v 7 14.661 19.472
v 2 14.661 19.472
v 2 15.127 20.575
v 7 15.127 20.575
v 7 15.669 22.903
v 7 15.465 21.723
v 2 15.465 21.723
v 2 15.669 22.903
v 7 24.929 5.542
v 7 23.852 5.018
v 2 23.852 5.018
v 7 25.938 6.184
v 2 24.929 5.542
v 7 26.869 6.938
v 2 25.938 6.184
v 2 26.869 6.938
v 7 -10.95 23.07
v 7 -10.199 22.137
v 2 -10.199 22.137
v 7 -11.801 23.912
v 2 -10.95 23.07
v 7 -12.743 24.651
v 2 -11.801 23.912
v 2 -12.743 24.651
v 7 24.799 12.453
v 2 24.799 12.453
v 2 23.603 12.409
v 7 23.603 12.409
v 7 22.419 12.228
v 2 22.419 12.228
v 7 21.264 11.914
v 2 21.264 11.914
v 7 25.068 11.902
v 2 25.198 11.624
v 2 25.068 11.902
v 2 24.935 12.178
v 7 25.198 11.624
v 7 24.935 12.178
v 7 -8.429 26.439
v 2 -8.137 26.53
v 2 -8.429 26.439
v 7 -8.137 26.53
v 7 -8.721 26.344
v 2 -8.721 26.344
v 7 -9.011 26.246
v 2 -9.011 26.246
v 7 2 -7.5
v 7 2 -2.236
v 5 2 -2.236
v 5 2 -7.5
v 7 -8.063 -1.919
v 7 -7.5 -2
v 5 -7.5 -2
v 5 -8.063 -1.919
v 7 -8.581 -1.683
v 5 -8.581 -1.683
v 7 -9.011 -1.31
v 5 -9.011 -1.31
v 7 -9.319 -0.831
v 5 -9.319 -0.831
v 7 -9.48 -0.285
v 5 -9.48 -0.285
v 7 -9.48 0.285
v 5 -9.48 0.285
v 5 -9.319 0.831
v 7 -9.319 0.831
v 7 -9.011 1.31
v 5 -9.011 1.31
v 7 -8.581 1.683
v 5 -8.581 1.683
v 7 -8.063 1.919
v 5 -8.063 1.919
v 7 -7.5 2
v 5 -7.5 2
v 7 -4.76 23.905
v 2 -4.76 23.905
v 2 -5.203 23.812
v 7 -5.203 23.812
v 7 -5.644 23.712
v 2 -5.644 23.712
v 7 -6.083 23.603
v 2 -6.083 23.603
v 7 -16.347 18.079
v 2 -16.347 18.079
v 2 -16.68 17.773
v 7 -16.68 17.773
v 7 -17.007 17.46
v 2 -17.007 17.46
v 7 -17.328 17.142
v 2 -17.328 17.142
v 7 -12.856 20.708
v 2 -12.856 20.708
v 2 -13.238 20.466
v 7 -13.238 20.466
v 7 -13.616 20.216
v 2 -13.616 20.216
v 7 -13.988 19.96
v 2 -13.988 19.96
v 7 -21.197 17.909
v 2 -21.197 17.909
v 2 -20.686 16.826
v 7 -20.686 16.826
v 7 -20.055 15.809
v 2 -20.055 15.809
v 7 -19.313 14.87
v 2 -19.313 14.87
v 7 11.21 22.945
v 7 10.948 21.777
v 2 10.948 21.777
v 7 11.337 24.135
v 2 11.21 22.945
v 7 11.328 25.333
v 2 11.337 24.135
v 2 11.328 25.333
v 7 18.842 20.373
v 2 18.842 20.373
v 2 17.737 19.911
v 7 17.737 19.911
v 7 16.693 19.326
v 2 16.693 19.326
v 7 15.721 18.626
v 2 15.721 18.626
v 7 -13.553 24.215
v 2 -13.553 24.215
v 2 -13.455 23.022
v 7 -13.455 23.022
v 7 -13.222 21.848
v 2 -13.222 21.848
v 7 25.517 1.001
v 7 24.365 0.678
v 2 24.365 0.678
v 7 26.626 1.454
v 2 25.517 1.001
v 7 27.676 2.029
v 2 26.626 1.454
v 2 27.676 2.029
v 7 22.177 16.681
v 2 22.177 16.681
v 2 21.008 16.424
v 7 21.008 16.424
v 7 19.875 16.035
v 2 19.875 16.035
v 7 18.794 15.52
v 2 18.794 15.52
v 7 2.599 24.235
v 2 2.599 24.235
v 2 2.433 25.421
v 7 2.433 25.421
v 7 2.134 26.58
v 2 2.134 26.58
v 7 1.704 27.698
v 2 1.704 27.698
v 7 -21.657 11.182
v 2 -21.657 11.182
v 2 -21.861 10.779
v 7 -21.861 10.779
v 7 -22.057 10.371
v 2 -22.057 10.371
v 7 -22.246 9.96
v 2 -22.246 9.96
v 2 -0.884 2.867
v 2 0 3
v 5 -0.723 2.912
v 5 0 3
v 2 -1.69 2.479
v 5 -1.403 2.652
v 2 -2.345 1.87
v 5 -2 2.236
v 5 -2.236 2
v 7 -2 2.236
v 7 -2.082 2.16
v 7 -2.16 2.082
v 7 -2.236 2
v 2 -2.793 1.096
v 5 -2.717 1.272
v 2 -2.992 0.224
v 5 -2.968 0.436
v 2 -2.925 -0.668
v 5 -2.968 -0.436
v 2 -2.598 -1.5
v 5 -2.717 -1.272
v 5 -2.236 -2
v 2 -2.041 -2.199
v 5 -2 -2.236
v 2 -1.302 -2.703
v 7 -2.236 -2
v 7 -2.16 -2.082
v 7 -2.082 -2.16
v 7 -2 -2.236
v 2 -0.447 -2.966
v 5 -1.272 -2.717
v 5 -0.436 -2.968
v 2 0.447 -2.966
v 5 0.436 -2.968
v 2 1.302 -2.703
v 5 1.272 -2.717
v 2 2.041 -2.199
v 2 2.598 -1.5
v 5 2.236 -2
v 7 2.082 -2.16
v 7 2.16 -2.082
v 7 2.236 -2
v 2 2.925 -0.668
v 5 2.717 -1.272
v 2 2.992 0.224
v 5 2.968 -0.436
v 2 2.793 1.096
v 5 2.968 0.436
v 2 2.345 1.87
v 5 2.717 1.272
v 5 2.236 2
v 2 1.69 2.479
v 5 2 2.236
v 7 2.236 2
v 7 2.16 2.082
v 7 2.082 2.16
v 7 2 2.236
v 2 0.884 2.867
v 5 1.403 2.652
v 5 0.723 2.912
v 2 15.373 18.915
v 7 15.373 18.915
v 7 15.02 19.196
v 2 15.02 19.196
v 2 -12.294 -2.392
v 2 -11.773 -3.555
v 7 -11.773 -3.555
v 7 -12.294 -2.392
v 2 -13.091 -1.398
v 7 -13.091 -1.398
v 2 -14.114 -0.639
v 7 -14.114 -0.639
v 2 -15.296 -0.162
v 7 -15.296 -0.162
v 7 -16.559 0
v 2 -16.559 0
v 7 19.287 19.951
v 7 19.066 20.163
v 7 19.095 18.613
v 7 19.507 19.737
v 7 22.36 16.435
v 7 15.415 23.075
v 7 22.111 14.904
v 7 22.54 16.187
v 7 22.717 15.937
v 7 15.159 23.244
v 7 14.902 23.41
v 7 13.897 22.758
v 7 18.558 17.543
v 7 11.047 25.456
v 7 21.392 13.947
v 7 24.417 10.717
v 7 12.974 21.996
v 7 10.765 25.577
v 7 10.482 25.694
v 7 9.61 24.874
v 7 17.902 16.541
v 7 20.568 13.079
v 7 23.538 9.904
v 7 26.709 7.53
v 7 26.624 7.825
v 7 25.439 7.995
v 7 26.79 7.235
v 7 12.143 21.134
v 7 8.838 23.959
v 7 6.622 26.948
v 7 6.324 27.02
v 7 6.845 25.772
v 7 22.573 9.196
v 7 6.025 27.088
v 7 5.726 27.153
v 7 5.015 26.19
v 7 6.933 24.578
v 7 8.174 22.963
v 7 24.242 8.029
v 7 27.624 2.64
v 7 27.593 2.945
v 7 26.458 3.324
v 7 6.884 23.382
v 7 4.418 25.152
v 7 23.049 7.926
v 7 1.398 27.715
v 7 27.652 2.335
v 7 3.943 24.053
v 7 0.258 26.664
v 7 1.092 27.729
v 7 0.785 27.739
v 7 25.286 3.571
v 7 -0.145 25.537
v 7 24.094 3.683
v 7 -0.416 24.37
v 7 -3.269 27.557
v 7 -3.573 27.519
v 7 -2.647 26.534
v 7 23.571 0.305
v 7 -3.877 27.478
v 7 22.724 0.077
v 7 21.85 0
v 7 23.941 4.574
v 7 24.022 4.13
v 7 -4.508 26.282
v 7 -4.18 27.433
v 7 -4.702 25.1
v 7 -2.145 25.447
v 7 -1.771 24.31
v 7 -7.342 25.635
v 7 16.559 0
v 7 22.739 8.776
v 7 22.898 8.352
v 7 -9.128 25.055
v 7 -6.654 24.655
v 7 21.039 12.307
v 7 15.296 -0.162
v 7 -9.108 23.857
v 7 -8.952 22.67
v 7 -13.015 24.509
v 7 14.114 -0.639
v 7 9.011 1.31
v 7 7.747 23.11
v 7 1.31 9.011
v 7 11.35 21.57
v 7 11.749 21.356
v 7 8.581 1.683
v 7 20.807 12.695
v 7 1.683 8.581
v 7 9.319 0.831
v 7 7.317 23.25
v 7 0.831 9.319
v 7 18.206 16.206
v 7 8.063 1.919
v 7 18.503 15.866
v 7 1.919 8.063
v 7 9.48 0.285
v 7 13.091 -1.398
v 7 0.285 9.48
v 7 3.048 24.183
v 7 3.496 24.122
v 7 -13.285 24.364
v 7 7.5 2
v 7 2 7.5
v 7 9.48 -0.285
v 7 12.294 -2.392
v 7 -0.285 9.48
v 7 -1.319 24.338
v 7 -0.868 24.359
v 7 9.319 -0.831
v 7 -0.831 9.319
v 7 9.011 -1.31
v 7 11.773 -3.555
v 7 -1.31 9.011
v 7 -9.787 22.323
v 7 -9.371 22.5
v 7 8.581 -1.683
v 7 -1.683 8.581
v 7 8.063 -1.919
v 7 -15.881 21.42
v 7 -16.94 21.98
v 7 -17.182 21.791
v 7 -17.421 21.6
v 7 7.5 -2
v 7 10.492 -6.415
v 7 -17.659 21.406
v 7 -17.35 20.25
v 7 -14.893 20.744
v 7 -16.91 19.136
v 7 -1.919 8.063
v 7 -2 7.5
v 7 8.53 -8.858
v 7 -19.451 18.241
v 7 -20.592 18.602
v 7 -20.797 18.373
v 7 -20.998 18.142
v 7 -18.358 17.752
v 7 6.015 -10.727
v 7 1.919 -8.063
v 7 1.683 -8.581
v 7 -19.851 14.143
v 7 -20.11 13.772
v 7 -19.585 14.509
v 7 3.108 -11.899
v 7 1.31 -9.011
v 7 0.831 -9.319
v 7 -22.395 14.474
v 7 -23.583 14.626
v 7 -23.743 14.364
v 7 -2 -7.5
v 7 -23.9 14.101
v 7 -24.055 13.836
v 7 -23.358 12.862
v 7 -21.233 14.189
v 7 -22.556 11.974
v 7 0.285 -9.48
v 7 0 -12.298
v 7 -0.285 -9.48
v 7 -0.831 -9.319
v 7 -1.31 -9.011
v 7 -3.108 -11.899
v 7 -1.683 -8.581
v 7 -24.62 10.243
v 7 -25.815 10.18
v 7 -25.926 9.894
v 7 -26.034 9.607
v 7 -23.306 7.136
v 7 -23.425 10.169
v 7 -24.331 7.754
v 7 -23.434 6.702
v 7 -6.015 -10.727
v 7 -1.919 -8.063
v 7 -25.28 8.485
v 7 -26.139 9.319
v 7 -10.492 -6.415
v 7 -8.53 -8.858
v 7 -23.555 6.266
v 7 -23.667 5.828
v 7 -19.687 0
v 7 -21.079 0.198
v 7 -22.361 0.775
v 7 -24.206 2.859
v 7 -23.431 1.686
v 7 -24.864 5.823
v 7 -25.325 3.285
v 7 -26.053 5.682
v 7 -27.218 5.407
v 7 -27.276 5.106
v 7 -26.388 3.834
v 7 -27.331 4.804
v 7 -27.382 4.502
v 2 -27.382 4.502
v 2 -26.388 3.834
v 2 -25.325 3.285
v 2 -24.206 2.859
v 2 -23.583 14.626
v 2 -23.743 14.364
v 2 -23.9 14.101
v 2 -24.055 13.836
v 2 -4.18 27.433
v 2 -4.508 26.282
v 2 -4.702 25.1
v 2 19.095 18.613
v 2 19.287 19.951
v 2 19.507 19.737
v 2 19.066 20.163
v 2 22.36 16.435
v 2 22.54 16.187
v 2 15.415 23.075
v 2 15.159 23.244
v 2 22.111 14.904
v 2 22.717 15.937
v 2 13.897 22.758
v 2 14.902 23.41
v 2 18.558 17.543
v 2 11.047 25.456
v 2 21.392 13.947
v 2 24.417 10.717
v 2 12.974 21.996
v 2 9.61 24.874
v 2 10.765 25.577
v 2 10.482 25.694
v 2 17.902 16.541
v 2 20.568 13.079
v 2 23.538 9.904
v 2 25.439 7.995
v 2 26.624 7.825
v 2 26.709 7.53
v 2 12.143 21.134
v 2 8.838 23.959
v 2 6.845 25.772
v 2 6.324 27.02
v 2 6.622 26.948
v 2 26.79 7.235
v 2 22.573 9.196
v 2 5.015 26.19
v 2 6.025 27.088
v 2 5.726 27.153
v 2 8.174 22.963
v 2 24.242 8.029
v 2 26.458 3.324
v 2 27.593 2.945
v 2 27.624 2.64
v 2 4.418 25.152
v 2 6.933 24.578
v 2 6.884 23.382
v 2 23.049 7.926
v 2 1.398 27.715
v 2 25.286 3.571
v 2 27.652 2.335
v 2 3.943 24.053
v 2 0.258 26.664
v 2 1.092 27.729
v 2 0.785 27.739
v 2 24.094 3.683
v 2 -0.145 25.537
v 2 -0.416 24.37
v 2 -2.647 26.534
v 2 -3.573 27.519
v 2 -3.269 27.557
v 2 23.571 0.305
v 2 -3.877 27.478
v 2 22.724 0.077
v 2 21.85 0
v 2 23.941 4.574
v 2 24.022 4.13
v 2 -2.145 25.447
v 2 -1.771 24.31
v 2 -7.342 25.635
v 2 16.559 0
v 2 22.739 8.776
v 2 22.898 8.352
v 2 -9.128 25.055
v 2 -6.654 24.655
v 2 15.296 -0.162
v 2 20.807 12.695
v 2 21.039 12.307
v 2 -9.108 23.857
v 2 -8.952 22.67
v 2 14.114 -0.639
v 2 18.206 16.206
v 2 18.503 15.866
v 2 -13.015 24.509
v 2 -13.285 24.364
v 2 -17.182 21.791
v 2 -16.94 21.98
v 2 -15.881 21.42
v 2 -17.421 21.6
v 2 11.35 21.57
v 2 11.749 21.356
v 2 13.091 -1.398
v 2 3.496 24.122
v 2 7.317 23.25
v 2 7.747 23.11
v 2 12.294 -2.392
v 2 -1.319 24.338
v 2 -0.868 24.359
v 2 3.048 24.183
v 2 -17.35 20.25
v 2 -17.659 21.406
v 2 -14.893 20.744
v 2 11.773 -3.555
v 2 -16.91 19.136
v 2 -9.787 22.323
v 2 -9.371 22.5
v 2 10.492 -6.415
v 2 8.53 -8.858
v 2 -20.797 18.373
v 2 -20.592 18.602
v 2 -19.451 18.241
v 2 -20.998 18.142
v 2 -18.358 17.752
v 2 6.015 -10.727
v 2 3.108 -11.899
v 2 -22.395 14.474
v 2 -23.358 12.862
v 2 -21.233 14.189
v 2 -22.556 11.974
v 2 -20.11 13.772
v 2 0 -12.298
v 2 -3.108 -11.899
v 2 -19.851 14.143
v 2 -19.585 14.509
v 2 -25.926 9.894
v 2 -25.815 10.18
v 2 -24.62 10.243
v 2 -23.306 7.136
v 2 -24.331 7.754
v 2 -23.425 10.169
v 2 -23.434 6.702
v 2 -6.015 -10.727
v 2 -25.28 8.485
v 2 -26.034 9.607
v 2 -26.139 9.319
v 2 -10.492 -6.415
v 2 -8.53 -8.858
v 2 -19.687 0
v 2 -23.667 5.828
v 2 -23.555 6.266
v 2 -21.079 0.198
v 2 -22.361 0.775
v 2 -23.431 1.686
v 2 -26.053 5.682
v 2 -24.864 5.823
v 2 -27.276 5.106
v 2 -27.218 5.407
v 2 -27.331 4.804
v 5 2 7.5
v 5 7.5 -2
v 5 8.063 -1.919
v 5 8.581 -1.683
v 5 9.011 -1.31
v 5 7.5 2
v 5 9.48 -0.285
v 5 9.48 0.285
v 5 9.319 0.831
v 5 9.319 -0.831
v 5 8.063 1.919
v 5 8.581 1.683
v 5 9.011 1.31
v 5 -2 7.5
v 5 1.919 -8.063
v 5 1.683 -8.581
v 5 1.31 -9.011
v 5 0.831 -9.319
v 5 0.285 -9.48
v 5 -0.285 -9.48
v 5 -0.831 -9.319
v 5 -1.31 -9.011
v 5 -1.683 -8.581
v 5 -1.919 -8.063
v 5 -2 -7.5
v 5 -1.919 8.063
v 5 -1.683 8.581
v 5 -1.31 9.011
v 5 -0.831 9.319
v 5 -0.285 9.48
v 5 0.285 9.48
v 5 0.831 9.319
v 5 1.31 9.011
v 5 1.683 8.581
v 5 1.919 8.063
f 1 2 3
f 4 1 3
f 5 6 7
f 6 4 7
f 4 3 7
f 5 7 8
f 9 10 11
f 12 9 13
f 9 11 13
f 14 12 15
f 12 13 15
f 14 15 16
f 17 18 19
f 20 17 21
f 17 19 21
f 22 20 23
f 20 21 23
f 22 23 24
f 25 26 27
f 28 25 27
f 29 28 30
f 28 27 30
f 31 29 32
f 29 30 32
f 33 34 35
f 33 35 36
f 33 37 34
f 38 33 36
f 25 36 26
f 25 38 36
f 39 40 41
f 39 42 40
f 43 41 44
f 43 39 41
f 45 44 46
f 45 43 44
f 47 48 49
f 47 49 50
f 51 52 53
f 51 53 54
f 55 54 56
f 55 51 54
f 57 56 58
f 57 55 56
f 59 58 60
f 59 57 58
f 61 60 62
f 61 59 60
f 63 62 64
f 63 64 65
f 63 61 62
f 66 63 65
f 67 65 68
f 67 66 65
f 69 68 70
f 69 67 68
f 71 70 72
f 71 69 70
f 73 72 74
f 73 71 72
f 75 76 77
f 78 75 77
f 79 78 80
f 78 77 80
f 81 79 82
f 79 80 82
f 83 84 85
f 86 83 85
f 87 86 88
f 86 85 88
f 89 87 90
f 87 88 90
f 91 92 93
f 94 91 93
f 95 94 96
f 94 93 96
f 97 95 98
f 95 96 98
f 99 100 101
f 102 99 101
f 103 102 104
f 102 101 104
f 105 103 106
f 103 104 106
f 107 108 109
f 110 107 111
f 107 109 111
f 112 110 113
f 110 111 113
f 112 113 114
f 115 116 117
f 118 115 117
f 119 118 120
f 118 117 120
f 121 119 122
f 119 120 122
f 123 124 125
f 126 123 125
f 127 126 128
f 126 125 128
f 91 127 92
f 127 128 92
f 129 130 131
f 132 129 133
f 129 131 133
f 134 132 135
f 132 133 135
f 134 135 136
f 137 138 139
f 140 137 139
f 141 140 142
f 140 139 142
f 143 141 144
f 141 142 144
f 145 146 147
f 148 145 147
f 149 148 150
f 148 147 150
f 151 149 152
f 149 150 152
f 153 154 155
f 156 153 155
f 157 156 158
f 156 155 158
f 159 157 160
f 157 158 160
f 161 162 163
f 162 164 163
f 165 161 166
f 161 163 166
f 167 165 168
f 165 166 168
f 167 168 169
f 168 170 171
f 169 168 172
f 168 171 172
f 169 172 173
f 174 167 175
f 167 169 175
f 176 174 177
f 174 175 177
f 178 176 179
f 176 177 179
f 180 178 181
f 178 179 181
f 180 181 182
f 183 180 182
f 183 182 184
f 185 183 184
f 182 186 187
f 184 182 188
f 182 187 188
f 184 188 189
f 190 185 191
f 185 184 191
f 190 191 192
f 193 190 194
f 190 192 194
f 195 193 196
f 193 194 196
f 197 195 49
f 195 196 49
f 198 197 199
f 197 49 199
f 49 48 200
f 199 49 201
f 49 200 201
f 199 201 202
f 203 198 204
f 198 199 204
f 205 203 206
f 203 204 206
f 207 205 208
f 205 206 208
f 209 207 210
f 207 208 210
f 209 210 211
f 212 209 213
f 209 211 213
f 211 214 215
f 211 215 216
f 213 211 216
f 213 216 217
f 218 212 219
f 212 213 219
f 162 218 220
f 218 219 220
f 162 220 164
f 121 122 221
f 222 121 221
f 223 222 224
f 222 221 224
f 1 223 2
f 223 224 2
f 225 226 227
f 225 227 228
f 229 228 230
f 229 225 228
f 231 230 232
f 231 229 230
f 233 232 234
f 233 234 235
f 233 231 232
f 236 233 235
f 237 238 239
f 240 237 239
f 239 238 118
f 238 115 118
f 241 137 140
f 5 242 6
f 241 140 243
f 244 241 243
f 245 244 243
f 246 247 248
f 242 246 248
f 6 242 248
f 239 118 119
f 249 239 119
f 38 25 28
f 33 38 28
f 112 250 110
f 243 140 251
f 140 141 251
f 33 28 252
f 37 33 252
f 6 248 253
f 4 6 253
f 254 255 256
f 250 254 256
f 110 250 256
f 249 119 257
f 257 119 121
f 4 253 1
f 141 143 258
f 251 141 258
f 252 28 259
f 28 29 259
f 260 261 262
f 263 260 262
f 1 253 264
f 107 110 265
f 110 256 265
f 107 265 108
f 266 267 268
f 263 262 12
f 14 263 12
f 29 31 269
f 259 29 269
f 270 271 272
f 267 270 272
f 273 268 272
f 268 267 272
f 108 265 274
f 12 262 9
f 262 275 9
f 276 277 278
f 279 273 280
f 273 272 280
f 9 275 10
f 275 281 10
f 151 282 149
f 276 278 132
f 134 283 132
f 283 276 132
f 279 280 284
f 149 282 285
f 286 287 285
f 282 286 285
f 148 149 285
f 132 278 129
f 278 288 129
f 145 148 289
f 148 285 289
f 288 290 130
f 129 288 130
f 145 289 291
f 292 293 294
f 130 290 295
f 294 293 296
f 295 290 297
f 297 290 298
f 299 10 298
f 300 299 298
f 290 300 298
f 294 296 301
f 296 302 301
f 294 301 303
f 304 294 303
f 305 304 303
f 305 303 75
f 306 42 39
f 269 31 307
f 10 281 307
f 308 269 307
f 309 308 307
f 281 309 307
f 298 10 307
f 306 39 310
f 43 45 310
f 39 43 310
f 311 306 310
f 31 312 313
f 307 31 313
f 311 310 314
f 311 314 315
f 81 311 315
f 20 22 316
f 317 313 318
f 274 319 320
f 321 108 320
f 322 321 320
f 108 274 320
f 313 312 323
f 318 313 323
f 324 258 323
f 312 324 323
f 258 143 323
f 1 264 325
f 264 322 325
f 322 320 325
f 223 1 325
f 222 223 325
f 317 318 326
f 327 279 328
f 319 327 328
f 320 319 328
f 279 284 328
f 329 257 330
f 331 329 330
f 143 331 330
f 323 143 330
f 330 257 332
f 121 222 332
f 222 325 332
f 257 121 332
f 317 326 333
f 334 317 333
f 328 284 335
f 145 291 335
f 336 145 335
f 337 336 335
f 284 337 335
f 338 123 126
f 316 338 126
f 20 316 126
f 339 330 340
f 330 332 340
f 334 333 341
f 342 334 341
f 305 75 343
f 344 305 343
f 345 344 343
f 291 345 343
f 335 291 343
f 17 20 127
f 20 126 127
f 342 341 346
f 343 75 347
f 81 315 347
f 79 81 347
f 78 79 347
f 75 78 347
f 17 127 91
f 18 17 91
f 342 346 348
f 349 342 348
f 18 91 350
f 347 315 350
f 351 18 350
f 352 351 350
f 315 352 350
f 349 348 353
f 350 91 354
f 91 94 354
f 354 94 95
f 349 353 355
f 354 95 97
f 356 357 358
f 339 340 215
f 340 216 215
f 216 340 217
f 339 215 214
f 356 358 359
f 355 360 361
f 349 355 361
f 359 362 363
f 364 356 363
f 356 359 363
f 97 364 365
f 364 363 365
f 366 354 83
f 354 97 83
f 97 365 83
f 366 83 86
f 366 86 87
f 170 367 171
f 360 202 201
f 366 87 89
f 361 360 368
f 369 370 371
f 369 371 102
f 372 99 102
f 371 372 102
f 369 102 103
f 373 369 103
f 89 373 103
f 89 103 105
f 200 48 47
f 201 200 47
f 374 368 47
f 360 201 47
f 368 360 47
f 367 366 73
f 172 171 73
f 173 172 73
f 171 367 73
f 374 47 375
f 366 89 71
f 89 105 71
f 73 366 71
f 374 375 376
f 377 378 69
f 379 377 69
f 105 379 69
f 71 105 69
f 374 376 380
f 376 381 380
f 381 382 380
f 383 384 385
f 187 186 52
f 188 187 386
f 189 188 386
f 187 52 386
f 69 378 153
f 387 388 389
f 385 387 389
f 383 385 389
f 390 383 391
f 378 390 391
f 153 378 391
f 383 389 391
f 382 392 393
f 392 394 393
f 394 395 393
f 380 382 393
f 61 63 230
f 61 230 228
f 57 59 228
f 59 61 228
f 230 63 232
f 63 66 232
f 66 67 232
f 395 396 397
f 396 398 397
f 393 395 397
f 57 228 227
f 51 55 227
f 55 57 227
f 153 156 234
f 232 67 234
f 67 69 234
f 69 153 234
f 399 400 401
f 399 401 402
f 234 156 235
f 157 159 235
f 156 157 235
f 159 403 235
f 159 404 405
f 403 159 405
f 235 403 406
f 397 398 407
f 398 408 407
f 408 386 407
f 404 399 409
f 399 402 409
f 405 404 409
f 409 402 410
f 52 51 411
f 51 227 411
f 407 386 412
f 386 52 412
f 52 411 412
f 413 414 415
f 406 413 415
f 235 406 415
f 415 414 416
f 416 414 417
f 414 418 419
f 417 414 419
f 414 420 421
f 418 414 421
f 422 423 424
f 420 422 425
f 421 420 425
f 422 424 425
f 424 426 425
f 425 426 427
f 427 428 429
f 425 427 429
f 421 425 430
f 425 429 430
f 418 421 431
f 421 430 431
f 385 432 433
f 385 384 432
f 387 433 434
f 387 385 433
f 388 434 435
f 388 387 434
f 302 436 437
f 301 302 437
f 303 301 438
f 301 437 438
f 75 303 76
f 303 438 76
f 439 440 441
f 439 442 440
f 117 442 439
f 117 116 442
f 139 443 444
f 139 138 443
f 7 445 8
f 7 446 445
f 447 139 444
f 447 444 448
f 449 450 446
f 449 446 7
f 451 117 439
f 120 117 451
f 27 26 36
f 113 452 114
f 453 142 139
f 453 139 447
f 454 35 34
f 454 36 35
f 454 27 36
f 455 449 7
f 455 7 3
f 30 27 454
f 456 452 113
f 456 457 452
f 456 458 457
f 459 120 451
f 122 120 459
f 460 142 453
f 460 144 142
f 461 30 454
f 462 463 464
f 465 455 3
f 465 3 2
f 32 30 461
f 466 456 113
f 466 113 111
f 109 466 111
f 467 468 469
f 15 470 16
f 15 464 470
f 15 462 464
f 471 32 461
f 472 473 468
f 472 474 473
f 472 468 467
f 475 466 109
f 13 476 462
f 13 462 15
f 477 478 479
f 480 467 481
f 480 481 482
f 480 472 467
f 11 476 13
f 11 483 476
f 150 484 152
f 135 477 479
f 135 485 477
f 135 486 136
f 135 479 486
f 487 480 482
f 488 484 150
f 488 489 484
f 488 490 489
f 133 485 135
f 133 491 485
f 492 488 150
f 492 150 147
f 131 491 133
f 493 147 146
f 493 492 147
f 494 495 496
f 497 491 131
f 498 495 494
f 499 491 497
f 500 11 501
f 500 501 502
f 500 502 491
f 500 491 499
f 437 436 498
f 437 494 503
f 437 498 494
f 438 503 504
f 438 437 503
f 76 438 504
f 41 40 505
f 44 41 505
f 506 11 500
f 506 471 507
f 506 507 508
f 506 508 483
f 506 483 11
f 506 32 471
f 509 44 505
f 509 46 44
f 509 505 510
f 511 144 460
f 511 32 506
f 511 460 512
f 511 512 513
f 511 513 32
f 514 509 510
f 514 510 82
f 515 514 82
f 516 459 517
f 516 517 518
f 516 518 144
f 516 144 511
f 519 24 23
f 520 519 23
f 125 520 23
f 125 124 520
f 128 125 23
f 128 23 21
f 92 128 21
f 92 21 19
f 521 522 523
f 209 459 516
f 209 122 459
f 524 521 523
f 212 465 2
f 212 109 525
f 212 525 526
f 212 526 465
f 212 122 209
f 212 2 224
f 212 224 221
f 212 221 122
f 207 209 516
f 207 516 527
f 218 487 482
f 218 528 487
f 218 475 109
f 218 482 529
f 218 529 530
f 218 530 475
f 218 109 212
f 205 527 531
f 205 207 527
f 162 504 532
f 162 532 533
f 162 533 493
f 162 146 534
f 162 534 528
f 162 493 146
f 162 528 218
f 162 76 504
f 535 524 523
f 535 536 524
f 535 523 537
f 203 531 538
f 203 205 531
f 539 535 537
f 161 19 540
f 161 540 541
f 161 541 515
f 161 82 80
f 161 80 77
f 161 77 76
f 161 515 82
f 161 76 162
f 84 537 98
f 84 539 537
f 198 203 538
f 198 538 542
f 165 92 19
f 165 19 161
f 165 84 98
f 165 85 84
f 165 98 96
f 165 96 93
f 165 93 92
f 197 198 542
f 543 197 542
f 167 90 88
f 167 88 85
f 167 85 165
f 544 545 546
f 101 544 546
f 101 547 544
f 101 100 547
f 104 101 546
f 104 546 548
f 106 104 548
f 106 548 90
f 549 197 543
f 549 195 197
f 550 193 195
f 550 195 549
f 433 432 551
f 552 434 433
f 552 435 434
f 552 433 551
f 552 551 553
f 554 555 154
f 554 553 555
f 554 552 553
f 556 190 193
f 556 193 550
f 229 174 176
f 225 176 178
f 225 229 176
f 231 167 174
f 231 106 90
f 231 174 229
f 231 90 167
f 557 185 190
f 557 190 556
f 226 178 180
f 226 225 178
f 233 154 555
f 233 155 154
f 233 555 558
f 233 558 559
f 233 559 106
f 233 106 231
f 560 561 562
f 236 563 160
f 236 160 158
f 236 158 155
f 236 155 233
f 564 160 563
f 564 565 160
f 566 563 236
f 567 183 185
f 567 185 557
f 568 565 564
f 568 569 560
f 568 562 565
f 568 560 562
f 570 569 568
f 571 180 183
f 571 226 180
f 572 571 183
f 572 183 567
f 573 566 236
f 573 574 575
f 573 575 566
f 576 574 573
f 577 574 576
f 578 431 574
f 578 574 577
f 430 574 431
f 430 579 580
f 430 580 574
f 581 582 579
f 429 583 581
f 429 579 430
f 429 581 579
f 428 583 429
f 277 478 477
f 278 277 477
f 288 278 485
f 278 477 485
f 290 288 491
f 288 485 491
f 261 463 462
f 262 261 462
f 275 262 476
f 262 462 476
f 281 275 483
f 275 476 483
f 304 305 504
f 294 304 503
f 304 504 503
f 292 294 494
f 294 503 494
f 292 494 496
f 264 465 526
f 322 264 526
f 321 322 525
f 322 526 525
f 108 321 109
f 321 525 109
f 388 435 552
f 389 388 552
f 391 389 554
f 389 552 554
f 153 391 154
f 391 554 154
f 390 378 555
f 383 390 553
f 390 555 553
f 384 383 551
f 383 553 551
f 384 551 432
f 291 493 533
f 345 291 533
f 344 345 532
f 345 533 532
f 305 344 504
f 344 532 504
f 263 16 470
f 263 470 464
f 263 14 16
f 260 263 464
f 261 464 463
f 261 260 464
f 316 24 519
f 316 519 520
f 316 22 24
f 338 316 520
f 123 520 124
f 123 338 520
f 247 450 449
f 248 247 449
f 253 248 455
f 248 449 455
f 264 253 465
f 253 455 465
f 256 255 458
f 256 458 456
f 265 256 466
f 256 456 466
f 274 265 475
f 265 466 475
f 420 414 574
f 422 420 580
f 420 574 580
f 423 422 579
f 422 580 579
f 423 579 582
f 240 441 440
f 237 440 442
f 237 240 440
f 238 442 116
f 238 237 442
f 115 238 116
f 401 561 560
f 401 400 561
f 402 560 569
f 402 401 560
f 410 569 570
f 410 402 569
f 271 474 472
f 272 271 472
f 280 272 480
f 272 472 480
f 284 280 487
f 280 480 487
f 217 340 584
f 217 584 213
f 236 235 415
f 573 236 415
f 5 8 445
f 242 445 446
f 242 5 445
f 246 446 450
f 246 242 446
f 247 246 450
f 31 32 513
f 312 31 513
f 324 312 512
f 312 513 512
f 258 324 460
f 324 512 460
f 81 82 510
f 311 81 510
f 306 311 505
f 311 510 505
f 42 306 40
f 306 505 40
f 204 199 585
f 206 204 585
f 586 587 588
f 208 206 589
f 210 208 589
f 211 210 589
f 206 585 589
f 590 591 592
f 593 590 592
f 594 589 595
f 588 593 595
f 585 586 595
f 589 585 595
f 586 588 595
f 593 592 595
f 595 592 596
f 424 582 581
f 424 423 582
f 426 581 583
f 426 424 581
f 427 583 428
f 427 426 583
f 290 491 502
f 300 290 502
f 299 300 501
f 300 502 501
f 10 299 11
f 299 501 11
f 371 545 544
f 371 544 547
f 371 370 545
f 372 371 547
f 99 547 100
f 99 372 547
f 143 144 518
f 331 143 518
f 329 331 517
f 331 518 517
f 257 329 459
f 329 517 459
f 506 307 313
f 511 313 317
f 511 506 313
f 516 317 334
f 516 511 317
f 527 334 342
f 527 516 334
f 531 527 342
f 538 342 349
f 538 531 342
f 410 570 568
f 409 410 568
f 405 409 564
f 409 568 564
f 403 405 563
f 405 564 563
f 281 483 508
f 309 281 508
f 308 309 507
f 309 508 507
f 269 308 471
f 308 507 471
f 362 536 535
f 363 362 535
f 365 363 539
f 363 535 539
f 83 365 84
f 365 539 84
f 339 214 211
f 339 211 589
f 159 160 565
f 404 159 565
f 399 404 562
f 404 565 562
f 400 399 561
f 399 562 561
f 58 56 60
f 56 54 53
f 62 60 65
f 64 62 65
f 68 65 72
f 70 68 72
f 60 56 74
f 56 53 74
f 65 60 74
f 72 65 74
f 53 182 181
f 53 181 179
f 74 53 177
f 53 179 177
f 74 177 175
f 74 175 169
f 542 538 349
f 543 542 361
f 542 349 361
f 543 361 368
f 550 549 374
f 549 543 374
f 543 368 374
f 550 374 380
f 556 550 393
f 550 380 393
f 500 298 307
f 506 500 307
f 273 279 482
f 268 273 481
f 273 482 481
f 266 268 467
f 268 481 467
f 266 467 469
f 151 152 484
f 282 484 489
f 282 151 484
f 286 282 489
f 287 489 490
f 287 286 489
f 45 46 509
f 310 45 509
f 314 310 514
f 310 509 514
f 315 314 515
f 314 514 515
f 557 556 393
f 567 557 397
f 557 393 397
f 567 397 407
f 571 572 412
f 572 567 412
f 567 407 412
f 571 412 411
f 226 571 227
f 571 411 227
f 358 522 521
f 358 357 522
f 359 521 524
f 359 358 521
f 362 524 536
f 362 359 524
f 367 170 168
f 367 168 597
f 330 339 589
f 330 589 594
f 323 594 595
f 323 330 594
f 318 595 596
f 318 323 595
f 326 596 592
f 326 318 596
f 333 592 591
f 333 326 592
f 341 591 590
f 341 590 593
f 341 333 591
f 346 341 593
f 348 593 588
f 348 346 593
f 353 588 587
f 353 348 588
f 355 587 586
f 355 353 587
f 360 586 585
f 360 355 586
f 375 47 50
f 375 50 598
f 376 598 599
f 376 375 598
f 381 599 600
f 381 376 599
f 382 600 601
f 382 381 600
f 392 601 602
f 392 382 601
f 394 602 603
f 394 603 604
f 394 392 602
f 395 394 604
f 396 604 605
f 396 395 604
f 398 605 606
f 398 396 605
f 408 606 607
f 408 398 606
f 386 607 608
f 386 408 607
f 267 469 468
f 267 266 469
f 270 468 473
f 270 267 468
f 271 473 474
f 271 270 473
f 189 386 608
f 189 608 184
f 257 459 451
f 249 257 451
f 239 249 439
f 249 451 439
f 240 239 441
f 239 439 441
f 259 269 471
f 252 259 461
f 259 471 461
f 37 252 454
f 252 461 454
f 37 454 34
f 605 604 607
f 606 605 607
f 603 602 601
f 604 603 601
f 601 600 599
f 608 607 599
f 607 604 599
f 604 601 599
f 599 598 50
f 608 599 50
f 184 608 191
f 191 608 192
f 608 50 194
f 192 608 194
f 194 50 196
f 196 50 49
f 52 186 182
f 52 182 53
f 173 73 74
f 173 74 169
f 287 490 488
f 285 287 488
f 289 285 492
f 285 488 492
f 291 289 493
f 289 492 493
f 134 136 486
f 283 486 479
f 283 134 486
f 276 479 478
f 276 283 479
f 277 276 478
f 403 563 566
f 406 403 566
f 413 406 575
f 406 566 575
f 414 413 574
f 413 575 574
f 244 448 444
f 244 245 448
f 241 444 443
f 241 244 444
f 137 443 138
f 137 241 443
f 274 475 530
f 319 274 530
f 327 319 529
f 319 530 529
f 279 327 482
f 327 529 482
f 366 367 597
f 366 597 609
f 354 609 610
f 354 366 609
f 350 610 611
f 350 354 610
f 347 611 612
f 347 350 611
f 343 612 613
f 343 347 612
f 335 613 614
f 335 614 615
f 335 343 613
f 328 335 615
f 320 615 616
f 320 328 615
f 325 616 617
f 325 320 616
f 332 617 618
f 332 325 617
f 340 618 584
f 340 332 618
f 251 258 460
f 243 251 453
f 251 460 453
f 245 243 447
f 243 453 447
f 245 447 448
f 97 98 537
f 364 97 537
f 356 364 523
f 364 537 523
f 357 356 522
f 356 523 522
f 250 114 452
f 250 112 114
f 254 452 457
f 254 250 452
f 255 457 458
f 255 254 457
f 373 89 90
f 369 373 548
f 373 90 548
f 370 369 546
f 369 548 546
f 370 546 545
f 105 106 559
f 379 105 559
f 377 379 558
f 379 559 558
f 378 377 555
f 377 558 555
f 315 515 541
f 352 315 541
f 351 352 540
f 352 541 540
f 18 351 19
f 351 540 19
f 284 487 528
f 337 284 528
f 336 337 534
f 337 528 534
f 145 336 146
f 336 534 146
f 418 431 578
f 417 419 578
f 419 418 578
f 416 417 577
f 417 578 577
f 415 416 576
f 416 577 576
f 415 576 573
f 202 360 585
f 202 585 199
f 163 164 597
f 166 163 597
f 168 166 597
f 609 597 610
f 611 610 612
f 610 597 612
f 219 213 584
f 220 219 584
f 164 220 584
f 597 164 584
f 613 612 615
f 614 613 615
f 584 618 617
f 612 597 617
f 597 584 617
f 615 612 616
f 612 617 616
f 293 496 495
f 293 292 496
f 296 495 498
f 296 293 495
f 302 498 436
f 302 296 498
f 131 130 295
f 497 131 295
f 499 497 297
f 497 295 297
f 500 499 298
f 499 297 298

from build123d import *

# Parameters (mm, degrees)
BASPROSKE_W             = 7
BASPROSKE_H             = 27.75
TOOTHCUT_DEPTH          = 40.863830724
TEETHCUTS_COUNT         = 35
TEETHCUTS_ANGLE         = 349.714285714
BORSKE_R                = 3
BORE_DEPTH              = 50.0000508
CUT_EXTRUDE1_DEPTH      = 2
CUT_EXTRUDE2_DEPTH      = 2
CUT_EXTRUDE3_DEPTH      = 10
CUT_EXTRUDE4_DEPTH      = 2
FILLET2_R               = 5
CUT_EXTRUDE5_DEPTH      = 10
FILLET3_R               = 5
CUT_EXTRUDE6_DEPTH      = 40.804405632
CUT_EXTRUDE6_DEPTH_BACK = 40.804405632


with BuildPart() as part:
    # BasProSke → Base-Revolve (revolve)
    with BuildSketch(Plane(origin=(0, 0, 0), x_dir=(1, 0, 0), z_dir=(0, 1, 0)), mode=Mode.PRIVATE) as base_revolve_sk:
        with Locations((3.5, 13.875)):
            Rectangle(BASPROSKE_W, BASPROSKE_H)
    revolve(base_revolve_sk.sketch.rotate(Axis((-10, 0, 0), (1, 0, 0)), 180), axis=Axis((-10, 0, 0), (1, 0, 0)))

    # TooCutSke → ToothCut (cut, through all)
    with BuildSketch(Plane(origin=(0, 0, 0), x_dir=(0, 0, -1), z_dir=(1, 0, 0))):
        with BuildLine():
            ThreePointArc((0.678148312, 24.364564245), (0, 24.374), (-0.678148312, 24.364564245))
            ThreePointArc((-0.678148312, 24.364564245), (-1.217075524, 26.091376176), (-2.044396801, 27.70005933))
            ThreePointArc((-2.044396801, 27.70005933), (0, 27.7754), (2.044396801, 27.70005933))
            ThreePointArc((2.044396801, 27.70005933), (1.217075524, 26.091376176), (0.678148312, 24.364564245))
        make_face()
    toothcut = extrude(amount=TOOTHCUT_DEPTH, mode=Mode.SUBTRACT)

    # TeethCuts: ToothCut ×35 about axis
    teethcuts_axis = Axis((-10, 0, 0), (1, 0, 0))
    for i in range(1, TEETHCUTS_COUNT):
        add(toothcut.rotate(teethcuts_axis, i * TEETHCUTS_ANGLE / (TEETHCUTS_COUNT - 1)), mode=Mode.SUBTRACT)

    # BorSke → Bore (cut, symmetric)
    with BuildSketch(Plane(origin=(0, 0, 0), x_dir=(0, 0, -1), z_dir=(1, 0, 0))):
        with Locations(Location((0, 0, 0), (0, 0, 180))):
            Circle(BORSKE_R)
    extrude(amount=BORE_DEPTH, both=True, mode=Mode.SUBTRACT)

    # Sketch3 → Cut-Extrude1 (cut)
    with BuildSketch(Plane(origin=(7, 0, 0), x_dir=(0, 0, -1), z_dir=(1, 0, 0))):
        with BuildLine():
            Line((-1.5, -7.5), (-1.5, 7.5))
            ThreePointArc((-1.5, 7.5), (0, 9), (1.5, 7.5))
            Line((1.5, 7.5), (1.5, -7.5))
            ThreePointArc((1.5, -7.5), (0, -9), (-1.5, -7.5))
        make_face()
    extrude(amount=-CUT_EXTRUDE1_DEPTH, mode=Mode.SUBTRACT)

    # Sketch4 → Cut-Extrude2 (cut)
    with BuildSketch(Plane(origin=(7, 0, 0), x_dir=(0, 0, -1), z_dir=(1, 0, 0))):
        with BuildLine():
            Line((-7.5, 1.5), (7.5, 1.5))
            ThreePointArc((7.5, 1.5), (9, 0), (7.5, -1.5))
            Line((7.5, -1.5), (-7.5, -1.5))
            ThreePointArc((-7.5, -1.5), (-9, 0), (-7.5, 1.5))
        make_face()
    extrude(amount=-CUT_EXTRUDE2_DEPTH, mode=Mode.SUBTRACT)

    # Sketch5 → Cut-Extrude3 (cut)
    with BuildSketch(Plane(origin=(7, 0, 0), x_dir=(0, 0, -1), z_dir=(1, 0, 0))):
        with BuildLine():
            ThreePointArc((12.297844577, 0), (8.695889295, -8.695889295), (0, -12.297844577))
            Line((0, -12.297844577), (0, -32.483772695))
            ThreePointArc((0, -32.483772695), (32.823056407, 0.339283713), (0, 33.16234012))
            Line((0, 33.16234012), (0, 12.297844577))
            ThreePointArc((0, 12.297844577), (8.695889295, 8.695889295), (12.297844577, 0))
        make_face()
    extrude(amount=-CUT_EXTRUDE3_DEPTH, mode=Mode.SUBTRACT)

    # Sketch6 → Cut-Extrude4 (cut)
    with BuildSketch(Plane(origin=(7, 0, 0), x_dir=(0, 0, -1), z_dir=(1, 0, 0))):
        with BuildLine():
            Line((-2, 2), (-2, 7.5))
            ThreePointArc((-2, 7.5), (0, 9.5), (2, 7.5))
            Line((2, 7.5), (2, 2))
            Line((2, 2), (7.5, 2))
            ThreePointArc((7.5, 2), (9.5, 0), (7.5, -2))
            Line((7.5, -2), (2, -2))
            Line((2, -2), (2, -7.5))
            ThreePointArc((2, -7.5), (0, -9.5), (-2, -7.5))
            Line((-2, -7.5), (-2, -2))
            Line((-2, -2), (-7.5, -2))
            ThreePointArc((-7.5, -2), (-9.5, 0), (-7.5, 2))
            Line((-7.5, 2), (-2, 2))
        make_face()
    extrude(amount=-CUT_EXTRUDE4_DEPTH, mode=Mode.SUBTRACT)

    # Fillet2
    fillet2_edges = [part.edges().sort_by_distance(p)[0] for p in [
        (3.5, -12.297844577, 0),
        (3.5, 12.297844577, 0),
    ]]
    fillet(fillet2_edges, radius=FILLET2_R)

    # Sketch8 → Cut-Extrude5 (cut)
    with BuildSketch(Plane(origin=(7, 0, 0), x_dir=(0, 0, -1), z_dir=(1, 0, 0))):
        Polygon((-2.859440987, -24.205690927), (-1.508604415, -24.327268419), (1.243700079, -24.574980307), (1.243700079, -32.134713867), (-1.933875746, -26.979191879), align=None)
    extrude(amount=-CUT_EXTRUDE5_DEPTH, mode=Mode.SUBTRACT)

    # Fillet3
    # the kernel refuses this fillet: 5 mm, written as the material it takes off along each edge
    with BuildSketch(Plane(origin=(13.309286436, 24.374, 0), x_dir=(0, -1, 0), z_dir=(-1, 0, 0))) as fillet3_piece_1:
        with BuildLine():
            CenterArc((2.523714574, 5), FILLET3_R, 239.81088364, 30.18911636)
            Line((0.009435755, 0.678148312), (-0.040849822, 0.591711278))
            ThreePointArc((-0.040849822, 0.591711278), (-0.097631269, 0.340498242), (-0.1, 0))
            Line((-0.1, 0), (0, -0.1))
            Line((0, -0.1), (2.523714574, -0.1))
            Line((2.523714574, -0.1), (2.523714574, 0))
        make_face()
    extrude(amount=19.618572871, mode=Mode.SUBTRACT)
    with BuildSketch(Plane(origin=(-11.93995811, -24.463045274, 0), x_dir=(0, 0.08963930890343594, 0.995974293995239), z_dir=(1, 0, 0))) as fillet3_piece_2:
        with BuildLine():
            CenterArc((5.407987307, -4.308559995), FILLET3_R, 120.490647096, 64.652210046)
            Line((0.428115837, -4.75675654), (0.328518408, -4.76572047))
            Line((0.328518408, -4.76572047), (-0.099597429, -0.008963931))
            Line((-0.099597429, -0.008963931), (0, 0.1))
            ThreePointArc((0, 0.1), (1.435499392, 0.1), (2.820259013, 0.0861712))
            Line((2.820259013, 0.0861712), (2.870998784, 0))
        make_face()
    extrude(amount=30.87991622, mode=Mode.SUBTRACT)

    # Sketch9 → Cut-Extrude6 (cut, two sides: drawn at the far end of the back side and taken through both)
    with BuildSketch(Plane(origin=(0, 0, 0), x_dir=(1, 0, 0), z_dir=(0, 1, 0)).offset(-CUT_EXTRUDE6_DEPTH_BACK)):
        Polygon((-2.448455727, -28.878486524), (2, -28.878486524), (2, 12.992603003), (-3.949809534, 12.992603003), (-3.949809534, -28.878486524), align=None)
    extrude(amount=CUT_EXTRUDE6_DEPTH + CUT_EXTRUDE6_DEPTH_BACK, mode=Mode.SUBTRACT)


solid = part.part
